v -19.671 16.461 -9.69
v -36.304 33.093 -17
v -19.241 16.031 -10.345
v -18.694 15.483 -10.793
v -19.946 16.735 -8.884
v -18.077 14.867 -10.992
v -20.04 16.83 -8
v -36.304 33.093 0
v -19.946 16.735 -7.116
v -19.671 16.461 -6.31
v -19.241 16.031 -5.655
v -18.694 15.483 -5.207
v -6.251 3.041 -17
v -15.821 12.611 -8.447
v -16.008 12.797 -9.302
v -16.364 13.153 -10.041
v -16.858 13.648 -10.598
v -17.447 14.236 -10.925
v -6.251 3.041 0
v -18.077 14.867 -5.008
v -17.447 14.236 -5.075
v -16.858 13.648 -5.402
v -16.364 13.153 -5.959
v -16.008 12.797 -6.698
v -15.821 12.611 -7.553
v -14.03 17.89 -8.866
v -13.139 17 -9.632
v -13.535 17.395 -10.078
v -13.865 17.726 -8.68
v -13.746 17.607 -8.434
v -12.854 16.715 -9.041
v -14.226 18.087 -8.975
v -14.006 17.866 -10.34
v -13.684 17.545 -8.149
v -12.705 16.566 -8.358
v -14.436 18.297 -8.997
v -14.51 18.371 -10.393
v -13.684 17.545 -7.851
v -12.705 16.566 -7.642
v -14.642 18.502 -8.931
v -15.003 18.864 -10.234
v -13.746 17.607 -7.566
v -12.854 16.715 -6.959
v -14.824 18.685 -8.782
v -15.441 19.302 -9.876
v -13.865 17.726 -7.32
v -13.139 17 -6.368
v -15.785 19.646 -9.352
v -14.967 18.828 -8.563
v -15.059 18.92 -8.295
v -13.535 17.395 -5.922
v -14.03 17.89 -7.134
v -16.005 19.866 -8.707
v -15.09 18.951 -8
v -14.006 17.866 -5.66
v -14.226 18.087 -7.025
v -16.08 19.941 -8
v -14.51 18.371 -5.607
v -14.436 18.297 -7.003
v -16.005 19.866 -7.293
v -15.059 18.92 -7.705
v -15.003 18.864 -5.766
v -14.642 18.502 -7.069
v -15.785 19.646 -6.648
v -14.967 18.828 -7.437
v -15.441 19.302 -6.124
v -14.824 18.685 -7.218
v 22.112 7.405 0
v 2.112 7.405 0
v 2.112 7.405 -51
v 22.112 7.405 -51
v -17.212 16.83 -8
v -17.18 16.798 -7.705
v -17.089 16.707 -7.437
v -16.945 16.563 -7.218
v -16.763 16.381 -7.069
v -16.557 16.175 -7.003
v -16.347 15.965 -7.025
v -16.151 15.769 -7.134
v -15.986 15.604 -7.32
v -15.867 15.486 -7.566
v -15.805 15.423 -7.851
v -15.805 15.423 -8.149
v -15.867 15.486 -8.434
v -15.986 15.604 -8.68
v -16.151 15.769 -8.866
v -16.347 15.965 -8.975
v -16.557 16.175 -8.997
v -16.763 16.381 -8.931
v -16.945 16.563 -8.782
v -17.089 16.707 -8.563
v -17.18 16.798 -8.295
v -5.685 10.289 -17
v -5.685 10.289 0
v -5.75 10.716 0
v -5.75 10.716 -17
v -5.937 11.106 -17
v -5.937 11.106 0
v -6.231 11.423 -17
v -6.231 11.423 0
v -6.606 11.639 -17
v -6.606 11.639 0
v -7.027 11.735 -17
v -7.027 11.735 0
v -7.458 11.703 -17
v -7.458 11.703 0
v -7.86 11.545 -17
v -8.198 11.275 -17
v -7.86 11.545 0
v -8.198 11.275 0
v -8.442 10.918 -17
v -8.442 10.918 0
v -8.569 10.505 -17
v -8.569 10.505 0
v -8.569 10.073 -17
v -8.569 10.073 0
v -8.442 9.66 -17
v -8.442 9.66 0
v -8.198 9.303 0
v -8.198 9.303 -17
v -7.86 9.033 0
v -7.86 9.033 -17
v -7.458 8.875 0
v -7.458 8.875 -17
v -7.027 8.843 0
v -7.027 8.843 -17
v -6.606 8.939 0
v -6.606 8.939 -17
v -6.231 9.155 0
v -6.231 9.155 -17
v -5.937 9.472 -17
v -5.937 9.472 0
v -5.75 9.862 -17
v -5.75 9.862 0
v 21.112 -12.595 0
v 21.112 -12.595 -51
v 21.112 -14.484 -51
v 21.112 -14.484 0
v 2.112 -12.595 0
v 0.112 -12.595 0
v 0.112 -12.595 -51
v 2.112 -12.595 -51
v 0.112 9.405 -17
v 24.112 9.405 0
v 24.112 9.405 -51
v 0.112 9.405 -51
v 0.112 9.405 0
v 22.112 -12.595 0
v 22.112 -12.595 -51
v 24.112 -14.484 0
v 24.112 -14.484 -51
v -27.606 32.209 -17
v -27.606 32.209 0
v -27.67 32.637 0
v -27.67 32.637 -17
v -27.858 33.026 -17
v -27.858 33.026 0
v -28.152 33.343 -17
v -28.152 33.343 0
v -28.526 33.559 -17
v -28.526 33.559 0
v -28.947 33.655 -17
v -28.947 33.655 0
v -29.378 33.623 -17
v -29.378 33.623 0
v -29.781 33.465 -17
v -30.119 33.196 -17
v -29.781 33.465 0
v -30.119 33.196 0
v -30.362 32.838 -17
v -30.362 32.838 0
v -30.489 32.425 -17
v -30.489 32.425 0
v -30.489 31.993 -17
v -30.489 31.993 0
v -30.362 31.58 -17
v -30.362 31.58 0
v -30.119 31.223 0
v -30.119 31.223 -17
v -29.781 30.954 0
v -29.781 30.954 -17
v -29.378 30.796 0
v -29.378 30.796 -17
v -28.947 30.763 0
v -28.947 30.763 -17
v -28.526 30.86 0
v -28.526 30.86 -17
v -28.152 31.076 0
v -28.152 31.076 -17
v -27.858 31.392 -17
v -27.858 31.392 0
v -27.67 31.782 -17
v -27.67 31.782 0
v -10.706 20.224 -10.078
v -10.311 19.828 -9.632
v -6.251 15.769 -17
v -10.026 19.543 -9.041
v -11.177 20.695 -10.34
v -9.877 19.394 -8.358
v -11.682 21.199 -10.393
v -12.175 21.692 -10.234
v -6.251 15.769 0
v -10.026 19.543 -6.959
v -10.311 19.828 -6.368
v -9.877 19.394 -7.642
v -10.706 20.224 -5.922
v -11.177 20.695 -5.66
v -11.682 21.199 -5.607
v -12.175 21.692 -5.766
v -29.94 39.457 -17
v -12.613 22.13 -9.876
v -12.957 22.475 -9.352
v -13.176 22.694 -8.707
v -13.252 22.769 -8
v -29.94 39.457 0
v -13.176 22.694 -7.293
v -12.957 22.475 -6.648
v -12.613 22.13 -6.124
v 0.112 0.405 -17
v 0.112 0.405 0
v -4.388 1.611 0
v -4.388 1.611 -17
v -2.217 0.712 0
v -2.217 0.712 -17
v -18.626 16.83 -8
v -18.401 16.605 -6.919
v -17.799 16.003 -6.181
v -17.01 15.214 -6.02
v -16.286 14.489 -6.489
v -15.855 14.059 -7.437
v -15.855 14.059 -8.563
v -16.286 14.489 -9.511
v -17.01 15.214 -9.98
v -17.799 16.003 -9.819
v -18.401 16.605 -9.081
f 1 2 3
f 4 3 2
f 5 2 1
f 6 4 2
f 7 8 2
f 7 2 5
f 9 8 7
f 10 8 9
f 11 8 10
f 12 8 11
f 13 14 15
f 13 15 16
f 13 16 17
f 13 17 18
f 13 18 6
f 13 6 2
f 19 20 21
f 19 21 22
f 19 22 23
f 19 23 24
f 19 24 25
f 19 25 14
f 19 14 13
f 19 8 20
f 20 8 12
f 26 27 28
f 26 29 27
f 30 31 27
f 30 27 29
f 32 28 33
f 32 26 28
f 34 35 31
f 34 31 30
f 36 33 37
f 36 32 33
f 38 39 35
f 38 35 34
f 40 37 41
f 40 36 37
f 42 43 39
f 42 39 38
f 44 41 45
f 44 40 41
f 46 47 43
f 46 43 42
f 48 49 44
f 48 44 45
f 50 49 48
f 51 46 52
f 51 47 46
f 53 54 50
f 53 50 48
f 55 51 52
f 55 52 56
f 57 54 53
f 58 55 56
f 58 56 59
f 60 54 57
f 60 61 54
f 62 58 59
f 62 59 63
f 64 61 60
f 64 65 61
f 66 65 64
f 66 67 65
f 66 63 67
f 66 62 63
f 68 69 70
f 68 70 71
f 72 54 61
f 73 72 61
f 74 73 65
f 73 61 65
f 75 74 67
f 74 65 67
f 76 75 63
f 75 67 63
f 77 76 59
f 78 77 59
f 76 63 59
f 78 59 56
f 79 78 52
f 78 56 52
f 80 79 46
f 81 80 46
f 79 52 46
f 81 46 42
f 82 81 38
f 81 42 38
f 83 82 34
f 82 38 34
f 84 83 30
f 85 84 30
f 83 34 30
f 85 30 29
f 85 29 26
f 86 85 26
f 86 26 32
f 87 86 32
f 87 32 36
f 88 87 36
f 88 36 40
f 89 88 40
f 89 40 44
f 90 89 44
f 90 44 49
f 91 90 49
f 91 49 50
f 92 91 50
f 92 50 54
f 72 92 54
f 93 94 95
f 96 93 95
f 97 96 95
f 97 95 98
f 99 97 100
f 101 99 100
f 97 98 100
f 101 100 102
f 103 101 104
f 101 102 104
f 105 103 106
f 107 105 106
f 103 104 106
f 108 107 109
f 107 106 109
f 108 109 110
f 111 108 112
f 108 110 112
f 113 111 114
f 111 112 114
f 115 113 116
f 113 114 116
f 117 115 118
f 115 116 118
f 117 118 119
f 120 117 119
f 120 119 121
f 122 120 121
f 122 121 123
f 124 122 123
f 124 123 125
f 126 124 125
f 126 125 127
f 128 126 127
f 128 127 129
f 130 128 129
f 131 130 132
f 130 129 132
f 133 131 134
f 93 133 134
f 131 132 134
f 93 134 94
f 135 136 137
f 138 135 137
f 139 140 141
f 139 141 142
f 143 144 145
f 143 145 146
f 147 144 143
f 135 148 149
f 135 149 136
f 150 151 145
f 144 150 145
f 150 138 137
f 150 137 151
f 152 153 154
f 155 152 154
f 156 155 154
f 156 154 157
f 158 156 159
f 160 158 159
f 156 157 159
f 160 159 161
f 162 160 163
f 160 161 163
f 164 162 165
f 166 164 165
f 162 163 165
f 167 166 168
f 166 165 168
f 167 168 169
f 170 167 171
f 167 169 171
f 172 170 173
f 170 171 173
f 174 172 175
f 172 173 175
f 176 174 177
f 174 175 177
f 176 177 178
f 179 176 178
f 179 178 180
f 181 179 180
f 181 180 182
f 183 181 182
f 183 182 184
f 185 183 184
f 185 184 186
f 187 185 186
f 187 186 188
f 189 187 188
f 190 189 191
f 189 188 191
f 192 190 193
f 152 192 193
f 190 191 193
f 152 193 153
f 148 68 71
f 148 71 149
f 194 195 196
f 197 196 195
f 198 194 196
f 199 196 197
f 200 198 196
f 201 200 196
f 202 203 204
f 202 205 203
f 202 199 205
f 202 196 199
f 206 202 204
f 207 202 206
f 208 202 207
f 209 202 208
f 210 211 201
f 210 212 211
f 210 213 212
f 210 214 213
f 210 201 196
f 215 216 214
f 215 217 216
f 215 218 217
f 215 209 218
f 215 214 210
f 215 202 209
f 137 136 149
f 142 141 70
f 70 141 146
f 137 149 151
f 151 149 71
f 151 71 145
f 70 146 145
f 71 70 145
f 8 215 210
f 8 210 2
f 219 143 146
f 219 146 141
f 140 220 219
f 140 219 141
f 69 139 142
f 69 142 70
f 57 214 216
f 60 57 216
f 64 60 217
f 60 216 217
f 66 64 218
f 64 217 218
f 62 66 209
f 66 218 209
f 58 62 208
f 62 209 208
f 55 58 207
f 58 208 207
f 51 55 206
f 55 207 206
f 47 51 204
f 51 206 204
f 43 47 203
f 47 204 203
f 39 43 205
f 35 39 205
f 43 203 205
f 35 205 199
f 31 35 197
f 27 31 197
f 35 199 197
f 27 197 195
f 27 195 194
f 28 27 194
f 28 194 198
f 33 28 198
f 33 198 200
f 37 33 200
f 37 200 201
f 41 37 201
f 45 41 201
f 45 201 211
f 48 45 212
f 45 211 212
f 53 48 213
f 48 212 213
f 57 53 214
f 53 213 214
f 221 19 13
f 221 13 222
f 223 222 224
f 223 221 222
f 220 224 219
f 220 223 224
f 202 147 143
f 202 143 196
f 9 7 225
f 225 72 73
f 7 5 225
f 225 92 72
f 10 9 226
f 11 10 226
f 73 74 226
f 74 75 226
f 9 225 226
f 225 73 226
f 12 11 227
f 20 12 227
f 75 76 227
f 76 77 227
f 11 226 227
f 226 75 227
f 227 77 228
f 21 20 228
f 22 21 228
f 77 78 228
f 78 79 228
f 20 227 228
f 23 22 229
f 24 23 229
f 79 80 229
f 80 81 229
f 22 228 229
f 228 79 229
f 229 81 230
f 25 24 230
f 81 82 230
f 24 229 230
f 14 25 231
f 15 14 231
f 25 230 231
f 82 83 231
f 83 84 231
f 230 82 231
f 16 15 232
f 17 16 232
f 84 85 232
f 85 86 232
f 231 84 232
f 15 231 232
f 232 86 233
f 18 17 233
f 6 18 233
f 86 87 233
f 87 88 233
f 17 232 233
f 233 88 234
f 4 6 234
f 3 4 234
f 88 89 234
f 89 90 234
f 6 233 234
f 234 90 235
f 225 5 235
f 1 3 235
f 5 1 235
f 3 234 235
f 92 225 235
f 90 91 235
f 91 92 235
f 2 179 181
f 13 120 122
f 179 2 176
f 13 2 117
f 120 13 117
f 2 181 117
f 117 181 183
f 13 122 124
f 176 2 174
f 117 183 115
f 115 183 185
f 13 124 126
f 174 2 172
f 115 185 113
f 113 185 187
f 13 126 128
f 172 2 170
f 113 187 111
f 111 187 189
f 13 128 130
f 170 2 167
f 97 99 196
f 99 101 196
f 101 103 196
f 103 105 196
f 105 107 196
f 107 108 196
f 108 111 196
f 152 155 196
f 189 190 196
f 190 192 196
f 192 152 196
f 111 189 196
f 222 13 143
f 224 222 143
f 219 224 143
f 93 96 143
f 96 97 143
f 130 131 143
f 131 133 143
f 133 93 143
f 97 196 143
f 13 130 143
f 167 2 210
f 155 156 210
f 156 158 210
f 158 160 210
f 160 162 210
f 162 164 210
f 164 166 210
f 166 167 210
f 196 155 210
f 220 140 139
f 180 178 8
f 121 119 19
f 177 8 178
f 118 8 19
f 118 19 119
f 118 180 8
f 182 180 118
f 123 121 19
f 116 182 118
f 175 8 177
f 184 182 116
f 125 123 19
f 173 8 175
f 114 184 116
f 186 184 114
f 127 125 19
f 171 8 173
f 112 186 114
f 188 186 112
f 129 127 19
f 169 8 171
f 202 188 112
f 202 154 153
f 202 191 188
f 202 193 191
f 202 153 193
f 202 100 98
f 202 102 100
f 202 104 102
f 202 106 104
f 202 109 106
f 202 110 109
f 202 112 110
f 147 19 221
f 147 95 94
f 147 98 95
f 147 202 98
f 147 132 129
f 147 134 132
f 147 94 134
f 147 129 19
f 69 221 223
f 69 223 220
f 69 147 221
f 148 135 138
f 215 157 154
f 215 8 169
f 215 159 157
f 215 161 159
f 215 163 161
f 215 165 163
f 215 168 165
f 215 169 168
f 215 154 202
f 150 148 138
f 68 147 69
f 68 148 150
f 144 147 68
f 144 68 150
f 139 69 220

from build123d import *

# Parameters (mm, degrees)
F0_R     = 1.45
F1_DEPTH = 17
F2_DEPTH = 51
F3_R     = 1
F4_DEPTH = 42.6430173342
F3_R_2   = 2.4
F5_DEPTH = 4
F6_SIZE  = 2


with BuildPart() as f1:
    # F0 (on Top) → F1 (new body)
    with BuildSketch(Plane.XY):
        with BuildLine():
            ThreePointArc((-6.2514946472, 3.0411327703), (-8.8875336165, 9.4050938009), (-6.2514946472, 15.7690548316))
            Line((-6.2514946472, 15.7690548316), (-29.9395718169, 39.4571320014))
            Line((-29.9395718169, 39.4571320014), (-36.3035328476, 33.0931709707))
            Line((-36.3035328476, 33.0931709707), (-6.2514946472, 3.0411327703))
        make_face()
        with Locations((-29.0556883405, 32.2092874942)):
            Circle(F0_R, mode=Mode.SUBTRACT)
        with BuildLine():
            Line((-6.2514946472, 3.0411327703), (0.1124663835, 9.4050938009))
            Line((0.1124663835, 9.4050938009), (-6.2514946472, 15.7690548316))
            ThreePointArc((-6.2514946472, 15.7690548316), (-8.8875336165, 9.4050938009), (-6.2514946472, 3.0411327703))
        make_face()
        with Locations((-7.1353781237, 10.2889772774)):
            Circle(F0_R, mode=Mode.SUBTRACT)
        with BuildLine():
            Line((0.1124663835, 0.4050938009), (0.1124663835, 9.4050938009))
            Line((0.1124663835, 9.4050938009), (-6.2514946472, 3.0411327703))
            ThreePointArc((-6.2514946472, 3.0411327703), (-3.3316845078, 1.0901780083), (0.1124663835, 0.4050938009))
        make_face()
        with BuildLine():
            Line((9.1124663835, 9.4050938009), (0.1124663835, 9.4050938009))
            Line((0.1124663835, 9.4050938009), (0.1124663835, 0.4050938009))
            ThreePointArc((0.1124663835, 0.4050938009), (1.1187766024, 0.4615296488), (2.1124663835, 0.6301294135))
            Line((2.1124663835, 0.6301294135), (2.1124663835, 7.4050938009))
            Line((2.1124663835, 7.4050938009), (8.8874307709, 7.4050938009))
            ThreePointArc((8.8874307709, 7.4050938009), (9.0560305356, 8.398783582), (9.1124663835, 9.4050938009))
        make_face()
        with BuildLine():
            ThreePointArc((2.1124663835, 0.6301294135), (1.1187766024, 0.4615296488), (0.1124663835, 0.4050938009))
            Line((0.1124663835, 0.4050938009), (0.1124663835, -12.5949061991))
            Line((0.1124663835, -12.5949061991), (2.1124663835, -12.5949061991))
            Line((2.1124663835, -12.5949061991), (2.1124663835, 0.6301294135))
        make_face()
        with BuildLine():
            Line((24.1124663835, 9.4050938009), (9.1124663835, 9.4050938009))
            ThreePointArc((9.1124663835, 9.4050938009), (9.0560305356, 8.398783582), (8.8874307709, 7.4050938009))
            Line((8.8874307709, 7.4050938009), (22.1124663835, 7.4050938009))
            Line((22.1124663835, 7.4050938009), (22.1124663835, -12.5949061991))
            Line((22.1124663835, -12.5949061991), (21.1124663835, -12.5949061991))
            Line((21.1124663835, -12.5949061991), (21.1124663835, -14.483826209))
            Line((21.1124663835, -14.483826209), (24.1124663835, -14.483826209))
            Line((24.1124663835, -14.483826209), (24.1124663835, -12.5945746742))
            Line((24.1124663835, -12.5945746742), (24.1124663835, 9.4050938009))
        make_face()
    extrude(amount=-F1_DEPTH)

    # F0 (on Top) → F2 (join)
    with BuildSketch(Plane.XY):
        with BuildLine():
            ThreePointArc((2.1124663835, 0.6301294135), (1.1187766024, 0.4615296488), (0.1124663835, 0.4050938009))
            Line((0.1124663835, 0.4050938009), (0.1124663835, -12.5949061991))
            Line((0.1124663835, -12.5949061991), (2.1124663835, -12.5949061991))
            Line((2.1124663835, -12.5949061991), (2.1124663835, 0.6301294135))
        make_face()
        with BuildLine():
            Line((9.1124663835, 9.4050938009), (0.1124663835, 9.4050938009))
            Line((0.1124663835, 9.4050938009), (0.1124663835, 0.4050938009))
            ThreePointArc((0.1124663835, 0.4050938009), (1.1187766024, 0.4615296488), (2.1124663835, 0.6301294135))
            Line((2.1124663835, 0.6301294135), (2.1124663835, 7.4050938009))
            Line((2.1124663835, 7.4050938009), (8.8874307709, 7.4050938009))
            ThreePointArc((8.8874307709, 7.4050938009), (9.0560305356, 8.398783582), (9.1124663835, 9.4050938009))
        make_face()
        with BuildLine():
            Line((24.1124663835, 9.4050938009), (9.1124663835, 9.4050938009))
            ThreePointArc((9.1124663835, 9.4050938009), (9.0560305356, 8.398783582), (8.8874307709, 7.4050938009))
            Line((8.8874307709, 7.4050938009), (22.1124663835, 7.4050938009))
            Line((22.1124663835, 7.4050938009), (22.1124663835, -12.5949061991))
            Line((22.1124663835, -12.5949061991), (21.1124663835, -12.5949061991))
            Line((21.1124663835, -12.5949061991), (21.1124663835, -14.483826209))
            Line((21.1124663835, -14.483826209), (24.1124663835, -14.483826209))
            Line((24.1124663835, -14.483826209), (24.1124663835, -12.5945746742))
            Line((24.1124663835, -12.5945746742), (24.1124663835, 9.4050938009))
        make_face()
    extrude(amount=-F2_DEPTH)

    # F3 (on face) → F4 (cut, through all)
    with BuildSketch(Plane(origin=(4.7587800922, 4.7587800922, 0), x_dir=(-0.7071067812, 0.7071067812, 0), z_dir=(0.7071067812, 0.7071067812, 0))):
        with Locations((23.0708798619, -8)):
            Circle(F3_R)
    extrude(amount=-F4_DEPTH, mode=Mode.SUBTRACT)

    # F3 (on face) → F5 (cut)
    with BuildSketch(Plane(origin=(4.7587800922, 4.7587800922, 0), x_dir=(-0.7071067812, 0.7071067812, 0), z_dir=(0.7071067812, 0.7071067812, 0))):
        with Locations((23.0708798619, -8)):
            Circle(F3_R_2)
        with Locations((23.0708798619, -8)):
            Circle(F3_R, mode=Mode.SUBTRACT)
    extrude(amount=-F5_DEPTH, mode=Mode.SUBTRACT)

    # F6
    f6_edges = [f1.edges().sort_by_distance(p)[0] for p in [
        (-17.21165, 14.001288, -8),
    ]]
    chamfer(f6_edges, length=F6_SIZE)


solid = f1.part
